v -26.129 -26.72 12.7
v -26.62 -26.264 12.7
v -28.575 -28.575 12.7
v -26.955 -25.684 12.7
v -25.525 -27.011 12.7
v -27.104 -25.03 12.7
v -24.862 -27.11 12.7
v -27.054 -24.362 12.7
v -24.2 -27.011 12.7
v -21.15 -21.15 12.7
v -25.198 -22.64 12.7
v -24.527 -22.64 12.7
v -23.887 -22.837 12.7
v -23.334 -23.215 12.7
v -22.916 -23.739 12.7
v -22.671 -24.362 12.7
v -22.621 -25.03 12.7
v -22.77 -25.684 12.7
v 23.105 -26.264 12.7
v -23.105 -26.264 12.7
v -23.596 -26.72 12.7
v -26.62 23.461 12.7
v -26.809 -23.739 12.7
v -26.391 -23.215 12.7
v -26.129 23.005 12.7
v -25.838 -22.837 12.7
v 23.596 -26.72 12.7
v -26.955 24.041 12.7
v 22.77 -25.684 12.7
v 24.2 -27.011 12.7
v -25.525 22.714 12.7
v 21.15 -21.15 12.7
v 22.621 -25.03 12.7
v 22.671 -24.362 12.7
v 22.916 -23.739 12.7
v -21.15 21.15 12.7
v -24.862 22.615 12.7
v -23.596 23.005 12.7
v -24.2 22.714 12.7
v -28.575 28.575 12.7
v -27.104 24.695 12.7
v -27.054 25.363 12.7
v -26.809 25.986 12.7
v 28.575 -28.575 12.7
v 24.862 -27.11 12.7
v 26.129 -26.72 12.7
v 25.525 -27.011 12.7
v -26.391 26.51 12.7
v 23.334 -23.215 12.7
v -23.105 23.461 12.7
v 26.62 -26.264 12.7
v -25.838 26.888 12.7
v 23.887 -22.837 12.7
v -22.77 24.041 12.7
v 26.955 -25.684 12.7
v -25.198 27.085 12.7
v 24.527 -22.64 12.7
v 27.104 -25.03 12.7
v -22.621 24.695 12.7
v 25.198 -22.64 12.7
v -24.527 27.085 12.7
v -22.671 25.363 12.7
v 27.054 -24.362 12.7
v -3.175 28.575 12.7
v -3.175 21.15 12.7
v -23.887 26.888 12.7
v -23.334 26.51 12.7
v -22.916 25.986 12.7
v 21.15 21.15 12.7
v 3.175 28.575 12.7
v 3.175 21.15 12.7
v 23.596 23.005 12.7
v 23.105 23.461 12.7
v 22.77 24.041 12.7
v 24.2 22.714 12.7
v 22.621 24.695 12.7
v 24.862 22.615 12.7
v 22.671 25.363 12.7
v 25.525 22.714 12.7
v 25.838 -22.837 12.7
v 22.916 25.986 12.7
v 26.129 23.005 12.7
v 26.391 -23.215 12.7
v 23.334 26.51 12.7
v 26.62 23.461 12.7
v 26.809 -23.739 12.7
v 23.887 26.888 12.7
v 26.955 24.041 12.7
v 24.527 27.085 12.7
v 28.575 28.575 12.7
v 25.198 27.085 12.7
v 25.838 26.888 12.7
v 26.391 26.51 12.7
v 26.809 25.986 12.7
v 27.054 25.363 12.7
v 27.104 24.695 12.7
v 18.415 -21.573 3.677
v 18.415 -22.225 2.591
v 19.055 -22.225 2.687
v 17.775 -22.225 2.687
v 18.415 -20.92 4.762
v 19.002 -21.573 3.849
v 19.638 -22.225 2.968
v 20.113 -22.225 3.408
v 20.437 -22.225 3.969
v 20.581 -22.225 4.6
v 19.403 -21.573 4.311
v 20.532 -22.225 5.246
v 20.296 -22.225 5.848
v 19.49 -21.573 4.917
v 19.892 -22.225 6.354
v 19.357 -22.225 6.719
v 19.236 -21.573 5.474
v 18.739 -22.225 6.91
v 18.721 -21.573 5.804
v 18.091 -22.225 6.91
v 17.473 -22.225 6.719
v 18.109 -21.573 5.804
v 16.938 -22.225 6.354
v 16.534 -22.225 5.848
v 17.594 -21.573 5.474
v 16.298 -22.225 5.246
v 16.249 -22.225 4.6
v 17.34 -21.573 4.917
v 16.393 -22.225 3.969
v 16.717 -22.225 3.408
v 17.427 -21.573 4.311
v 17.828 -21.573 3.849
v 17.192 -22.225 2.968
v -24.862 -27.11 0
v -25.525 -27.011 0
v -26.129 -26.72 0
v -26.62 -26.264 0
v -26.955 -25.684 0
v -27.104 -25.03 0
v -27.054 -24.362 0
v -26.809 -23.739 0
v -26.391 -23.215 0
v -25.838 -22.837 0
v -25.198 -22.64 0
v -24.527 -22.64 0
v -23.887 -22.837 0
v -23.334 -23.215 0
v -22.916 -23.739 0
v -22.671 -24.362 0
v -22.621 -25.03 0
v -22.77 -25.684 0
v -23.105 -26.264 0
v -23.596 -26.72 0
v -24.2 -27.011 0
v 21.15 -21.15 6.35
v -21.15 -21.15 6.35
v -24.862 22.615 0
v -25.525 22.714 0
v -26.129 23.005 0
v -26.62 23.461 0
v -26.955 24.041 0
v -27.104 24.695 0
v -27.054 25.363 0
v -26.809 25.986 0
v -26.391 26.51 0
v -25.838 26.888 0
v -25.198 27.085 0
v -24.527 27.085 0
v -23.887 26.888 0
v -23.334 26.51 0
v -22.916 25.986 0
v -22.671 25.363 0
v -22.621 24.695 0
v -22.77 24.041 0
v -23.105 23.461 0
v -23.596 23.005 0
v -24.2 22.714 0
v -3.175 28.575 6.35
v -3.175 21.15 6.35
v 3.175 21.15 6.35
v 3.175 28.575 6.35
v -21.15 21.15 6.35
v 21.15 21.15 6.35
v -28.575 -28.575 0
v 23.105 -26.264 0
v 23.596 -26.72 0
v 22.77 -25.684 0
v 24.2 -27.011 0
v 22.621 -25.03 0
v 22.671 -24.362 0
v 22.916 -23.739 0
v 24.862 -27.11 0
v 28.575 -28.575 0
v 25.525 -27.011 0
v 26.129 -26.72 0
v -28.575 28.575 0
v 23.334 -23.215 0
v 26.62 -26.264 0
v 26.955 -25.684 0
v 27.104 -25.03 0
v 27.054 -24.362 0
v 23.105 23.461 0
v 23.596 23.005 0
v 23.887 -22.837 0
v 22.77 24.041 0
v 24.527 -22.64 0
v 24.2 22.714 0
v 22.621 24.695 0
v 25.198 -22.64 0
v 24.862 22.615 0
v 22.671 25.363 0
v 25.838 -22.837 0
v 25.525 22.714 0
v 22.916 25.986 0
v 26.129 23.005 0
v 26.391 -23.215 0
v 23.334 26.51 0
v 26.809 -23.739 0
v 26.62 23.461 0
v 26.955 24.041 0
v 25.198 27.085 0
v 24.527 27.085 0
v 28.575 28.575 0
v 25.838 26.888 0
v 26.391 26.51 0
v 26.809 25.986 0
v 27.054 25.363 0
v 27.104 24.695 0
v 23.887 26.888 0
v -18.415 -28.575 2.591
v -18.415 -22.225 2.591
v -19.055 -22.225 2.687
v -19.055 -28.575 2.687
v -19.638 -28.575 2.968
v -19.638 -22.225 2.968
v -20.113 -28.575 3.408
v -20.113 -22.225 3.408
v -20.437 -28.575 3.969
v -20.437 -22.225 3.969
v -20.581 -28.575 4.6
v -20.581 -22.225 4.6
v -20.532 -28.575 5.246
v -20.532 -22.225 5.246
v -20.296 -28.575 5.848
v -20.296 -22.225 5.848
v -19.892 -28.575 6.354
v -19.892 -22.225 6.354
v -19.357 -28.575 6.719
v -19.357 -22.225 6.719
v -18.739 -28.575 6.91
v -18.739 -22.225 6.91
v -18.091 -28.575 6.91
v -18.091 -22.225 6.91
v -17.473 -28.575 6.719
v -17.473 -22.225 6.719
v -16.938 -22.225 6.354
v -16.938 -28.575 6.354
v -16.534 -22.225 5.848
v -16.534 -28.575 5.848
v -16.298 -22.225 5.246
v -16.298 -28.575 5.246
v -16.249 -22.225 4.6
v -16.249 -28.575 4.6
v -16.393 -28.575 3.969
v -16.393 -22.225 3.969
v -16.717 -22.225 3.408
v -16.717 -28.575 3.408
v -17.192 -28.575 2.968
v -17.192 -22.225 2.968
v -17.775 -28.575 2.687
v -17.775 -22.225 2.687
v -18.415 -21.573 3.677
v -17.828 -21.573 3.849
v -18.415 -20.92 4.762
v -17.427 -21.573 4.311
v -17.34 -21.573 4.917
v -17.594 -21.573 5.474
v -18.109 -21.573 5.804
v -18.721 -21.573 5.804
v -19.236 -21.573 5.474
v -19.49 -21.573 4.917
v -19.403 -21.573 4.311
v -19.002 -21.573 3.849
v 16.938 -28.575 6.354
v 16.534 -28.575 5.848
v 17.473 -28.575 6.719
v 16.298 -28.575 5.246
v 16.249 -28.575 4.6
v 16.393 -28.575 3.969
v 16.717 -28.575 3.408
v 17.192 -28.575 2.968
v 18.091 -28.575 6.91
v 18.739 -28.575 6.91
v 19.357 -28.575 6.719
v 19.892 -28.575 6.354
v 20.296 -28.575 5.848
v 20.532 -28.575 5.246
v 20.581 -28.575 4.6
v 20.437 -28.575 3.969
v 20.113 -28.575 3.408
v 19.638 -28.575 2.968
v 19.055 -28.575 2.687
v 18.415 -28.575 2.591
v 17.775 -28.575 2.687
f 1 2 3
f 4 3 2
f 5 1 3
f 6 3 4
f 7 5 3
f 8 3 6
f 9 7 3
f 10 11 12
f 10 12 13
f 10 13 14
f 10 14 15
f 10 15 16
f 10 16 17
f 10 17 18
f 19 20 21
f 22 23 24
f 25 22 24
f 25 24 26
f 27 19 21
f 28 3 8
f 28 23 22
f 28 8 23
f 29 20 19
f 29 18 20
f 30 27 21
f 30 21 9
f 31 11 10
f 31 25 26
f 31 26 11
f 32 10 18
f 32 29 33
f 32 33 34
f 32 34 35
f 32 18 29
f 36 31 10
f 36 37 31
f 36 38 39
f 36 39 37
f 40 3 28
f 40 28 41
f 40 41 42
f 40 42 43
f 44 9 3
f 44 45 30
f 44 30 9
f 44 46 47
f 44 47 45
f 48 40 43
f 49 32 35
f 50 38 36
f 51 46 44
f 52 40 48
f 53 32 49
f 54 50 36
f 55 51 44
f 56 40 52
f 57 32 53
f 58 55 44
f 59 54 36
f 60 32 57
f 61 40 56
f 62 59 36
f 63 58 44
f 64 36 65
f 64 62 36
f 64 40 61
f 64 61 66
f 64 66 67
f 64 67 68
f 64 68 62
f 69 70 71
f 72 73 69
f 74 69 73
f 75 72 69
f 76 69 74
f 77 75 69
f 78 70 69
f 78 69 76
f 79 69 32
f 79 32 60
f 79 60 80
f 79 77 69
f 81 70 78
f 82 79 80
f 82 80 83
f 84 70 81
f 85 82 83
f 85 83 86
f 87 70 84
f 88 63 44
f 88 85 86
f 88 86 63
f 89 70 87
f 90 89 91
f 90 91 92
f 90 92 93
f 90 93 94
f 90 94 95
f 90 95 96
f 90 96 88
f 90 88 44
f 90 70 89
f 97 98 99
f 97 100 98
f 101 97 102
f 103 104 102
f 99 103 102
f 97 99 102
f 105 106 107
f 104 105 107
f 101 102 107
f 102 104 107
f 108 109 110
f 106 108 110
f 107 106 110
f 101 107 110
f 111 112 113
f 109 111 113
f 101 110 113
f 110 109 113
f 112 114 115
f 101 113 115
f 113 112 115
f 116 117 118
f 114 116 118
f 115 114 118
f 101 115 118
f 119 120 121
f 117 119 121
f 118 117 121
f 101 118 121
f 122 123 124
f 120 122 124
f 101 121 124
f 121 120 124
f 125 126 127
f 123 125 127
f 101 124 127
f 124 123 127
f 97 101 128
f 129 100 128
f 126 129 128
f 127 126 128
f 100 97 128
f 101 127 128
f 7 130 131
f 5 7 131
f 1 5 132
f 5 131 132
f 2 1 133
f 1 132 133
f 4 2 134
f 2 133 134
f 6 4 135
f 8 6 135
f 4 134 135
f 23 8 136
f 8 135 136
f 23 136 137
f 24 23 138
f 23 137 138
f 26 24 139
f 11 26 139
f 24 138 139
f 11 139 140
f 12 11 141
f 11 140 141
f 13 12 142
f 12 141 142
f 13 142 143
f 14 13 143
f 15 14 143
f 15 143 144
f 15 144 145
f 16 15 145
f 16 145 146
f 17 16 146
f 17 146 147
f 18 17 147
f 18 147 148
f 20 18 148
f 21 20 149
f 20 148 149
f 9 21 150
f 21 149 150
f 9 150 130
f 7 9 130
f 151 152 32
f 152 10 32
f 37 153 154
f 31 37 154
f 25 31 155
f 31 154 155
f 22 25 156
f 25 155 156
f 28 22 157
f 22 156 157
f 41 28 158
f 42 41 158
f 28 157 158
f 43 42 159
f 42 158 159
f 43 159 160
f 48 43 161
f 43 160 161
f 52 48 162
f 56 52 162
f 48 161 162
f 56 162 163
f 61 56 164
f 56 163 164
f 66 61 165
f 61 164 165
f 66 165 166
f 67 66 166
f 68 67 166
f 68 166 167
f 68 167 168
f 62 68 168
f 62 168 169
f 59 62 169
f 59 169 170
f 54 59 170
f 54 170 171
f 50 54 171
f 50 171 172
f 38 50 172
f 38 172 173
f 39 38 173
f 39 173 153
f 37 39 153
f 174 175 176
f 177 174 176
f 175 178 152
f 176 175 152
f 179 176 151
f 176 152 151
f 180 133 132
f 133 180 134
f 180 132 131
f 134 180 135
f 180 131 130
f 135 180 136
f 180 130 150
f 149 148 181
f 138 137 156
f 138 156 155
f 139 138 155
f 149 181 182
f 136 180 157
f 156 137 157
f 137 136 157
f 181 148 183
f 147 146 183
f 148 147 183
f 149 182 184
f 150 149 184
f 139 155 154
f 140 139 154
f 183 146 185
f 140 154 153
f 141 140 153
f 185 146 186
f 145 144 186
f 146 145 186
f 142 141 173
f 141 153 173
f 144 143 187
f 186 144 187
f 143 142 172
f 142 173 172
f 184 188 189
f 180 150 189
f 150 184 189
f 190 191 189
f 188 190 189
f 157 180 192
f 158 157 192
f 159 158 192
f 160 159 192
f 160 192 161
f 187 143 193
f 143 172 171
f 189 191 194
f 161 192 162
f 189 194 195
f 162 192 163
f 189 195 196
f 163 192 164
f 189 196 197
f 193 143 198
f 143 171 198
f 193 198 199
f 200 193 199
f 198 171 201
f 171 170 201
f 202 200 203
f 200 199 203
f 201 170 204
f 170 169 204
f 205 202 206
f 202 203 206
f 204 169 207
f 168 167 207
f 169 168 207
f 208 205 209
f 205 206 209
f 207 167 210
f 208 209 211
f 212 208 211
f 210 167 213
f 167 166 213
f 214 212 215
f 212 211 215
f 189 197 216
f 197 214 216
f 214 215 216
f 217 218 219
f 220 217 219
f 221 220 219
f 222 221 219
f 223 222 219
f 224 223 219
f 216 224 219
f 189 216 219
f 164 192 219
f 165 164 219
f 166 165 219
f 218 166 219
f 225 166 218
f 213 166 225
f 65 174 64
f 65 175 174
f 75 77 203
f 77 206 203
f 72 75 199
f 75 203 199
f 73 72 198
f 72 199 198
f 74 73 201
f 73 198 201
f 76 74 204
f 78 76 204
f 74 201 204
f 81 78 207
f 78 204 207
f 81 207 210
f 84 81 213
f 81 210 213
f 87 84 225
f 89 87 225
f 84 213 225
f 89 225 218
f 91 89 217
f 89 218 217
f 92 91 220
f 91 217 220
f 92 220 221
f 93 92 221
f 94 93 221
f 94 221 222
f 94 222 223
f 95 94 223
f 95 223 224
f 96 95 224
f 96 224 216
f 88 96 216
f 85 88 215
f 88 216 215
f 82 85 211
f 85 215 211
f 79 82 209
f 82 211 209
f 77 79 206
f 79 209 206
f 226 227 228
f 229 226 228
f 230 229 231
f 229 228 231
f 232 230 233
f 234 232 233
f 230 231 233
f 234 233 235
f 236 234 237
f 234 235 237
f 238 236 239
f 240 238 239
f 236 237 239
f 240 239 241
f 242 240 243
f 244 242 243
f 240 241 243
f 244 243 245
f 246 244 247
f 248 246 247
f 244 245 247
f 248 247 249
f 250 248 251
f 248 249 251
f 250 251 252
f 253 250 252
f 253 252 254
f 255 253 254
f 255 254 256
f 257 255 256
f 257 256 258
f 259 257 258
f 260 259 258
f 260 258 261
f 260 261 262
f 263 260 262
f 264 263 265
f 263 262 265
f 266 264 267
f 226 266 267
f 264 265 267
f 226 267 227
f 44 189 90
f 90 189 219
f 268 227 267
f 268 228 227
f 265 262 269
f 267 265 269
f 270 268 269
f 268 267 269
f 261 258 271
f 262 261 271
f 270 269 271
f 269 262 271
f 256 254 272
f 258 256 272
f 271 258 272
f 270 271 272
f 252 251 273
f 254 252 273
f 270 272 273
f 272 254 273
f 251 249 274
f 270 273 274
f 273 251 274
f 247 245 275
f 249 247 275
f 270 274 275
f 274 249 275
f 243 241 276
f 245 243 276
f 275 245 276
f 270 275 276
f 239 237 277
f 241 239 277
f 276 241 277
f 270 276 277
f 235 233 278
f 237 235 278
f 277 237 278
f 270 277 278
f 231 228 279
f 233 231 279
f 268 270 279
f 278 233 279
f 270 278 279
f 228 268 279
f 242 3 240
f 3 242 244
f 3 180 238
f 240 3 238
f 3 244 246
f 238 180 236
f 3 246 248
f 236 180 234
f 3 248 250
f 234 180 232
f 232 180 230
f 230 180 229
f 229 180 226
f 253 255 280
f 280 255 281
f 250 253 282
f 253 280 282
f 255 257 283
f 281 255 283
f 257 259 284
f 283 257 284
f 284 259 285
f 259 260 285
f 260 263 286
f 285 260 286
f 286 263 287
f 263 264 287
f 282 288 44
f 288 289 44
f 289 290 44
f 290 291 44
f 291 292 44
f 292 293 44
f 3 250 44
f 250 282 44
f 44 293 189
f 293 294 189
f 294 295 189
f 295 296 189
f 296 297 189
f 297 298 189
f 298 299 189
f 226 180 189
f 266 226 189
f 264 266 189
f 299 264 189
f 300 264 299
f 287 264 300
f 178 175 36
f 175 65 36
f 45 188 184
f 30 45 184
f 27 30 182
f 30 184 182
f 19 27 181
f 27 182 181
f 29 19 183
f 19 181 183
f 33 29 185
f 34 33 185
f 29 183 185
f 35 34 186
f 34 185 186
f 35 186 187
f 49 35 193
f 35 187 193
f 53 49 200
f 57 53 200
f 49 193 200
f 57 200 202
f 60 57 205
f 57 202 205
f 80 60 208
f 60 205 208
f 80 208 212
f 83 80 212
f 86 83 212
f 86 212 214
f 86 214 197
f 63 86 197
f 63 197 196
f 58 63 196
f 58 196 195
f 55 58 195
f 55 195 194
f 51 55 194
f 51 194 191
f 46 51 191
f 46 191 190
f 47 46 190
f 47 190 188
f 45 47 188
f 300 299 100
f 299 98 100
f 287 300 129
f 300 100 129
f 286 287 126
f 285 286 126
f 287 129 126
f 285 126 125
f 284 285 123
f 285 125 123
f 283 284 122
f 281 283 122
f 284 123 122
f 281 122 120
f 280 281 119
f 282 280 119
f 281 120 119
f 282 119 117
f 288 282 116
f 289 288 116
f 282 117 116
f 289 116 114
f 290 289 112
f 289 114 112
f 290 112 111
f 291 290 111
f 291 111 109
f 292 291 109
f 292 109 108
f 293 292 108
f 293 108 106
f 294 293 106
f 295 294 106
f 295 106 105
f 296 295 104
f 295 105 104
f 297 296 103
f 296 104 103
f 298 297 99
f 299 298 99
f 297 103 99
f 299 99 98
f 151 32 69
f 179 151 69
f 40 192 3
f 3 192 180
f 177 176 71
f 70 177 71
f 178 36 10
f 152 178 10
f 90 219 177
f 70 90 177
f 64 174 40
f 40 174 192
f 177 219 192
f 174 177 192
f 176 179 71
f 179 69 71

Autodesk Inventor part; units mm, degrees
ref_plane "YZ Plane" through (0, 0, 0) normal (1, 0, 0) x (0, 1, 0)
ref_plane "XZ Plane" through (0, 0, 0) normal (0, 1, 0) x (-1, 0, 0)
ref_plane "XY Plane" through (0, 0, 0) normal (0, 0, 1) x (1, 0, 0)
sketch "Sketch1" plane through (0, 0, 0) normal (0, 0, 1) x (1, 0, 0)
  line L0 (-28.575, -28.575) -> (28.575, -28.575)
  line L1 (28.575, -28.575) -> (28.575, 28.575)
  line L2 (28.575, 28.575) -> (-28.575, 28.575)
  line L3 (-28.575, 28.575) -> (-28.575, -28.575)
  line L4 (-28.575, -28.575) -> (28.575, 28.575) construction
  line L5 (28.575, -28.575) -> (-28.575, 28.575) construction
  point P0 (0, 0)
  dimension "d0" = 57.15
  dimension "d1" = 57.15
extrude "Extrusion1" add sketch "Sketch1" along normal blind 12.7
sketch "Sketch2" plane through (0, 0, 12.7) normal (0, 0, 1) x (1, 0, 0)
  line L0 (-21.15, -21.15) -> (21.15, -21.15)
  line L1 (21.15, -21.15) -> (21.15, 21.15)
  line L2 (21.15, 21.15) -> (-21.15, 21.15)
  line L3 (-21.15, 21.15) -> (-21.15, -21.15)
  line L4 (-21.15, -21.15) -> (21.15, 21.15) construction
  line L5 (21.15, -21.15) -> (-21.15, 21.15) construction
  point P0 (0, 0)
  dimension "d4" = 42.3
  dimension "d5" = 42.3
extrude "Extrusion2" cut sketch "Sketch2" against normal blind 6.35
sketch "Sketch3" plane through (-21.15, 21.15, 12.7) normal (0, -1, 0) x (1, 0, 0)
  line L0 (0, 0) -> (42.3, 0) projected
  line L1 (0, 0) -> (0, -6.35) projected
  line L2 (0, -6.35) -> (42.3, -6.35) projected
  line L3 (42.3, 0) -> (42.3, -6.35) projected
  line L4 (21.15, -6.35) -> (24.325, -6.35)
  line L5 (24.325, -6.35) -> (24.325, 0)
  line L6 (24.325, 0) -> (21.15, 0)
  line L7 (21.15, -6.35) -> (17.975, -6.35)
  line L8 (17.975, -6.35) -> (17.975, 0)
  line L9 (17.975, 0) -> (21.15, 0)
  point P0 (21.15, -12.7)
  dimension "d10" = 17.975
  dimension "d11" = 17.975
extrude "Extrusion3" cut sketch "Sketch3" against normal up to next contours L0 L5 L2 L8
sketch "Sketch4" plane through (0, 0, 12.7) normal (0, 0, 1) x (1, 0, 0)
  line L0 (28.575, -28.575) -> (28.575, 28.575) projected
  line L1 (28.575, 28.575) -> (3.175, 28.575) projected
  line L2 (28.575, 28.575) -> (-28.575, -28.575) construction
  line L3 (-28.575, 28.575) -> (28.575, -28.575) construction
  line L4 (28.575, 24.8625) -> (24.8625, 24.8625) construction
  line L5 (-24.8625, -24.8625) -> (24.8625, -24.8625) construction
  line L6 (24.8625, -24.8625) -> (24.8625, 24.8625) construction
  line L7 (24.8625, 24.8625) -> (-24.8625, 24.8625) construction
  line L8 (-24.8625, 24.8625) -> (-24.8625, -24.8625) construction
  line L9 (-24.8625, -24.8625) -> (24.8625, 24.8625) construction
  line L10 (24.8625, -24.8625) -> (-24.8625, 24.8625) construction
  point P0 (0, 0)
  dimension "d14" = 3.7125
hole "Hole1" at (-24.8625, 24.8625, 12.7) at (24.8625, 24.8625, 12.7) at (24.8625, -24.8625, 12.7) at (-24.8625, -24.8625, 12.7) direction (0, 0, -1) diameter 4.4958 end through all clearance for "Flat Head Machine Screw (82)" size "#8" standard "Ansi Unified Screw Threads"
sketch "Sketch5" plane through (-28.575, -28.575, 0) normal (0, -1, 0) x (1, 0, 0)
  line L0 (57.15, 0) -> (57.15, 12.7) projected
  line L1 (0, 12.7) -> (57.15, 12.7) projected
  line L2 (0, 0) -> (0, 12.7) projected
  line L3 (3.9568, 4.7625) -> (48.9174, 4.7625) construction
  point P0 (28.575, 0)
  point P1 (10.16, 4.7625)
  point P2 (46.99, 4.7625)
  dimension "d22" = 7.9375
  dimension "d23" = 10.16
  dimension "d24" = 10.16
hole "Hole2" at (-18.415, -28.575, 4.7625) at (18.415, -28.575, 4.7625) direction (0, 1, 0) diameter 4.3434 depth 6.35 tip angle 118 thread size "12-24 UNC" class "2B" standard "ANSI Unified Screw Threads"
equation "\"d1\" = d0"
equation "\"d11\" = d10"
equation "\"d24\" = d23"
properties part number "NEMA_17-back" material "Aluminum 6061"
